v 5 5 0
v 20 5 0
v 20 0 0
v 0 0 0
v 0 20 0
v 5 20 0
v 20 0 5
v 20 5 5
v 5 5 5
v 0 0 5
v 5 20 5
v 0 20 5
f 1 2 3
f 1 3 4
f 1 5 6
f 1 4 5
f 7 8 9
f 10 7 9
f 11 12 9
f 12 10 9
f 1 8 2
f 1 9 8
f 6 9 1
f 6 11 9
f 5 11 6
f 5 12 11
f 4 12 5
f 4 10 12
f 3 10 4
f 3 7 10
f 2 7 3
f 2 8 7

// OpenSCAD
// An L shaped prism. The top and bottom faces merge into a concave polygon, so
// the surface normal cannot be taken from the cross product of the first two
// edges of the loop - at a reflex corner that points into the body and turns
// the face inside out.
//
// Measured, and asserted by the driver: what the exporter has to report for
// the above to have happened. A silently faceted export is still a valid one,
// so validity alone cannot see a recogniser that has stopped recognising.
//
// The four zeros, not "nothing was declared": the extrusion's caps and its
// straight walls are planes and are declared as such. What must stay empty is
// the curved channel, and that is what the zeros say.
// EXPECT: 0 analytic surfaces available (0 cylindrical, 0 spherical, 0 toroidal, 0 Bezier)
//
// The plane channel is pinned too, so that narrowing the line above did not
// leave it unwatched. Eight is the model's: the profile is a hexagon, so six
// walls, and a linear extrusion has two caps. Every one of the eight faces is
// written on one of them rather than on a plane fitted to its own corners, which
// is the whole of what a declaration buys for something already flat - the
// coefficients stop moving when a later pass touches a vertex.
// EXPECT: and 8 declared planes
// EXPECT: 8 planar faces written on a plane the model declared
//
// The L is 175 square units by the shoelace formula, extruded 5, so 875. A
// concave outline is where a normal taken from the first two edges of a loop
// points the wrong way, and an inverted face would show up here as a volume
// that is not this one.
// ROUNDTRIP: Plane=8
// VOLUME: 875
linear_extrude(height = 5)
  polygon([[0, 0], [20, 0], [20, 5], [5, 5], [5, 20], [0, 20]]);
